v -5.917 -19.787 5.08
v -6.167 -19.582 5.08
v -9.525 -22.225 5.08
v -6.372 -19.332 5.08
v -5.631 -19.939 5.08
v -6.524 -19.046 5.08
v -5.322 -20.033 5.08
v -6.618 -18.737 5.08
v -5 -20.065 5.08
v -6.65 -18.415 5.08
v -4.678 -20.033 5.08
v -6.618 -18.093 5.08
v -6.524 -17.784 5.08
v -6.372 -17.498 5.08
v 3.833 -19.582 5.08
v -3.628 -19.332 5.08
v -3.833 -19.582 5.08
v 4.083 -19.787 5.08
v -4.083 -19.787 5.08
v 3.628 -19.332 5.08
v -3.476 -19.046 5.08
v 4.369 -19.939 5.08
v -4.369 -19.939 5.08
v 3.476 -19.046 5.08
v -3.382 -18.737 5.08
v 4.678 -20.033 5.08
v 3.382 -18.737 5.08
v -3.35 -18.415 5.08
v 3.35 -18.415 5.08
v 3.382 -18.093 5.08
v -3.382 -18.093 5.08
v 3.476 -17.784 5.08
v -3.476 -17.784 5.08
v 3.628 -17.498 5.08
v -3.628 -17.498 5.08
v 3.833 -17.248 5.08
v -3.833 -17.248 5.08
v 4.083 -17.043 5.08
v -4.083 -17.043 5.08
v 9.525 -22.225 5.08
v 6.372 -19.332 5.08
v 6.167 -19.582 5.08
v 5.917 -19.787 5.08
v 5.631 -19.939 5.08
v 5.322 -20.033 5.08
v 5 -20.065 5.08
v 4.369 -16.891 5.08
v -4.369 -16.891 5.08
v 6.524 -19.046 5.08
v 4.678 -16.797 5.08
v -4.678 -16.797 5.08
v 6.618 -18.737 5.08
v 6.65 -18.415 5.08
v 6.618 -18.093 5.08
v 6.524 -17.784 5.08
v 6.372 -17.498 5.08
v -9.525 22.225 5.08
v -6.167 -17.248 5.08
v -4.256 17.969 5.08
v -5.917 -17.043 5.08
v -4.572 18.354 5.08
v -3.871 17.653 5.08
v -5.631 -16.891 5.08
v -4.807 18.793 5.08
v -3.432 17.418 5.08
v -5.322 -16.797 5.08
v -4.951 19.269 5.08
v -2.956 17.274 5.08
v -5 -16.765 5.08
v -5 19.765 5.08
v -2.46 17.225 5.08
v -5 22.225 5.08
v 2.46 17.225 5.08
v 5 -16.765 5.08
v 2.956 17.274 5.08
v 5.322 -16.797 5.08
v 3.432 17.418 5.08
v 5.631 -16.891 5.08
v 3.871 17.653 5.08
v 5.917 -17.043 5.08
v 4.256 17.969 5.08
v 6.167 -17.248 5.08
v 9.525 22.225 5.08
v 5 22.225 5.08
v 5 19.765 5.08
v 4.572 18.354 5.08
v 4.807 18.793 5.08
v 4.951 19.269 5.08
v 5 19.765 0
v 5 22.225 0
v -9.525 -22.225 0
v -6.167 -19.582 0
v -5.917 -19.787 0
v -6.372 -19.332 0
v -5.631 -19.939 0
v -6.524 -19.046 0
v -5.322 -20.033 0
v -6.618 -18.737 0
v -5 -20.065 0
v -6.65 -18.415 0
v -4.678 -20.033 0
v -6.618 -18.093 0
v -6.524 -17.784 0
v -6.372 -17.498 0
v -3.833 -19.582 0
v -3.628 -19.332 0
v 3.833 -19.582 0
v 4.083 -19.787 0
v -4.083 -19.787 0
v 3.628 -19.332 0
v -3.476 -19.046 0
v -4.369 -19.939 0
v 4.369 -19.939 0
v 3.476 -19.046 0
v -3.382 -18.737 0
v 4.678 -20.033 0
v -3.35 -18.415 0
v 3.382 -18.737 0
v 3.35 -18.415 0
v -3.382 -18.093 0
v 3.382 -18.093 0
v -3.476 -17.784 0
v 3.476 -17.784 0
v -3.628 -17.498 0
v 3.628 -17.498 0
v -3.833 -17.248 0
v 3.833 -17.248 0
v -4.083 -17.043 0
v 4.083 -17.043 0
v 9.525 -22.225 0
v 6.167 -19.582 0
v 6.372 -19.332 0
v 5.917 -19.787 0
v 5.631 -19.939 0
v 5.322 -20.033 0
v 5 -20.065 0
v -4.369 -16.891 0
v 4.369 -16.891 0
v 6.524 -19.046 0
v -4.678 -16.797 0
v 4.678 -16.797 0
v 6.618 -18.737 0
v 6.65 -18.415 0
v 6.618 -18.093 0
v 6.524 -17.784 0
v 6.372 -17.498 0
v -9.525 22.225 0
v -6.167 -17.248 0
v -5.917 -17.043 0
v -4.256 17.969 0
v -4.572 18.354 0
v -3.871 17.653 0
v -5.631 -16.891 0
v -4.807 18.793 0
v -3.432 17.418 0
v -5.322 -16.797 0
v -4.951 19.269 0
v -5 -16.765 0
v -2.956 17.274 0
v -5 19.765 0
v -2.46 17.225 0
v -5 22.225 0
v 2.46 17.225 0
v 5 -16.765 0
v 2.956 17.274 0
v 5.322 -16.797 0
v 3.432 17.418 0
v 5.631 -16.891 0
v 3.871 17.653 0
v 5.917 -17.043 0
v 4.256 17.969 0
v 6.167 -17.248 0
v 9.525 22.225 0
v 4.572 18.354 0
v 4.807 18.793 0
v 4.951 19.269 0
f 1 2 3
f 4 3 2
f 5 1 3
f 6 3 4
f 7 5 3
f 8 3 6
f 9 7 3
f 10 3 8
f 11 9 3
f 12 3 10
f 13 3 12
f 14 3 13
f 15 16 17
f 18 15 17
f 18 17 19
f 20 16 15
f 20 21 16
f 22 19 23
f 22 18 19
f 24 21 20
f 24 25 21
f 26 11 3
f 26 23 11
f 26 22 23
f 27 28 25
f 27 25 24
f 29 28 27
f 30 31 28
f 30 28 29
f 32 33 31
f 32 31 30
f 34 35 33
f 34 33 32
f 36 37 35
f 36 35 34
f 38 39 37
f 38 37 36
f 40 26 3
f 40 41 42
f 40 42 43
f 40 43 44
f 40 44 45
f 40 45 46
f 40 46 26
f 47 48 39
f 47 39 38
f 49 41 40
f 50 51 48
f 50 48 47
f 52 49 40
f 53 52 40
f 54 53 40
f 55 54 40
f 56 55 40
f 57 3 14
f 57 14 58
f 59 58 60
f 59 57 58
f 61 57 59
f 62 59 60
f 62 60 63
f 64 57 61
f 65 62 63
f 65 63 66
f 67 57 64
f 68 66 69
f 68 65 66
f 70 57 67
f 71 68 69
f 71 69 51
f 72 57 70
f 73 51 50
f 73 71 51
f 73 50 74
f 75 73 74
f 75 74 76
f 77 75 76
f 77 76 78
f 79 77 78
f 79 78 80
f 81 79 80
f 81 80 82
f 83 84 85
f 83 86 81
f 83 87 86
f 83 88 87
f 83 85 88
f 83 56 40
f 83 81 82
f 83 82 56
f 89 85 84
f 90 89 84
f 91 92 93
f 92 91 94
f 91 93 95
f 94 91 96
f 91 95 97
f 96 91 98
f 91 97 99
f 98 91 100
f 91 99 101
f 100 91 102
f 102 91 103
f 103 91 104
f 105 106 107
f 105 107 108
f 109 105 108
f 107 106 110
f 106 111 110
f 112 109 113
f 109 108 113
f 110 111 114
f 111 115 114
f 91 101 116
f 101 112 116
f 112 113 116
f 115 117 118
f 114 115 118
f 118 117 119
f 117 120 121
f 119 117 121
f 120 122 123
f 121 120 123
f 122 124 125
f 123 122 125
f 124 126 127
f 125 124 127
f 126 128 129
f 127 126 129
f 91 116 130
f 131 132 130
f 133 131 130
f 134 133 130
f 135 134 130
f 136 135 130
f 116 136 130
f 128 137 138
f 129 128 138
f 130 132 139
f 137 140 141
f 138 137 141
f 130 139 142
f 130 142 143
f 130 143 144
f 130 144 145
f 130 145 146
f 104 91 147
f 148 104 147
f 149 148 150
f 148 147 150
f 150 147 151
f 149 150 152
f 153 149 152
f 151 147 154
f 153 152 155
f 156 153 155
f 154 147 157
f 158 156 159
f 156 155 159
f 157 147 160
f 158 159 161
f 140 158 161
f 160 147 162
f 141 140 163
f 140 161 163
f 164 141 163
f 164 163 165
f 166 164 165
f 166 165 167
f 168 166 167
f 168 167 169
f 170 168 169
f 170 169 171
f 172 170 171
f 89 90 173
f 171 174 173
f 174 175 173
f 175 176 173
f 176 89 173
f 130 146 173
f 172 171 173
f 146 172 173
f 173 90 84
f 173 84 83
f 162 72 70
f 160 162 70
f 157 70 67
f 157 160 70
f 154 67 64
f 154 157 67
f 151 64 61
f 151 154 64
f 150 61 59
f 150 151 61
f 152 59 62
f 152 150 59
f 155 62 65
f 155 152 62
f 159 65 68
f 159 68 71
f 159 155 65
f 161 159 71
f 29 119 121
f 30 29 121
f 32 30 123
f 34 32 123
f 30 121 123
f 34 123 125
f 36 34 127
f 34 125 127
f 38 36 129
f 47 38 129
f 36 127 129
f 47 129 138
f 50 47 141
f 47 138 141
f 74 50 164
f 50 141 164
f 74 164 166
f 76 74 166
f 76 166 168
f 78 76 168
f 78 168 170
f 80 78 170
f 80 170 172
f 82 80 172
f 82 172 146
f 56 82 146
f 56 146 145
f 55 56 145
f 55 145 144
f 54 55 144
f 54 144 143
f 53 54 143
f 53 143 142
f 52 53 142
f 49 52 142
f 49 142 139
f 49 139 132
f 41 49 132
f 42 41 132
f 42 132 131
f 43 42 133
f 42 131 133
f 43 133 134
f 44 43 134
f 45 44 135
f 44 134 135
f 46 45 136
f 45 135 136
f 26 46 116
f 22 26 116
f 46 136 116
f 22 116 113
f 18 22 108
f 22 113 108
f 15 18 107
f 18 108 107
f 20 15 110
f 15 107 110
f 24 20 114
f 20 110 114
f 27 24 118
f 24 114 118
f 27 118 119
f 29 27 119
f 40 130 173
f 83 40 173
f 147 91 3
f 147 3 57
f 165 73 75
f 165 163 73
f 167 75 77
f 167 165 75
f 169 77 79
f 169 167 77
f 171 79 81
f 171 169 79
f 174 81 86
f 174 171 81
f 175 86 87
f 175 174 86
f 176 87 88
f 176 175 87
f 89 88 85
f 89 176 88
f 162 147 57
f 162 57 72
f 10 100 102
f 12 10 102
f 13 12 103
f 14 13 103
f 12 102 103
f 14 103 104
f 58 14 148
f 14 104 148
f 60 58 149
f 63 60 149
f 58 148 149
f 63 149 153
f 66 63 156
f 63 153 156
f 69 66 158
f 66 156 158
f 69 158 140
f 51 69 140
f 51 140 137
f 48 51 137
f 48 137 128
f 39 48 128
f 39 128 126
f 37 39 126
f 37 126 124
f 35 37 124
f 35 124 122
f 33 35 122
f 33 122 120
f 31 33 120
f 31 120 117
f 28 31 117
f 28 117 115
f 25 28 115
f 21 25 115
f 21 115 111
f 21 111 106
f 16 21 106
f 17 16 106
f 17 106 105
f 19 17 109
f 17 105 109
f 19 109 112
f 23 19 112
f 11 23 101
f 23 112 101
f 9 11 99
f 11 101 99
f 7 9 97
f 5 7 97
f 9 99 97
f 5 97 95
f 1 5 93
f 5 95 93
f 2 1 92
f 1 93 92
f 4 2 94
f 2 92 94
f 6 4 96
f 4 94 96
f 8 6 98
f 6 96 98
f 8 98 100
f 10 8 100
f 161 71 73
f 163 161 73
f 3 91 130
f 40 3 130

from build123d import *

# Parameters (mm, degrees)
F0_W     = 19.05
F0_H     = 44.45
F1_DEPTH = 5.08
F2_W     = 10
F2_H     = 5
F3_DEPTH = 25.4
F4_R     = 2.54
F6_D     = 3.3
F6_DEPTH = 12.7
F6_TIP   = 0.9914200214


with BuildPart() as f1:
    # F0 (on Top) → F1 (new body)
    with BuildSketch(Plane.XY):
        Rectangle(F0_W, F0_H)
    extrude(amount=F1_DEPTH)

    # F2 (on face) → F3 (cut)
    with BuildSketch(Plane.XY.offset(5.08)):
        with Locations((0, 24.725)):
            Rectangle(F2_W, F2_H)
        with Locations((0, 19.725)):
            Rectangle(F2_W, F2_H)
    extrude(amount=-F3_DEPTH, mode=Mode.SUBTRACT)

    # F4
    f4_edges = [f1.edges().sort_by_distance(p)[0] for p in [
        (-5, 17.225, 2.54),
        (5, 17.225, 2.54),
    ]]
    fillet(f4_edges, radius=F4_R)

    # F6
    with Locations(Plane.XY.offset(5.08)):
        with Locations((-5, -18.415), (5, -18.415)):
            Hole(F6_D / 2, depth=F6_DEPTH)
            with Locations((0, 0, -(F6_DEPTH + F6_TIP / 2))):  # 118° drill point
                Cone(0, F6_D / 2, F6_TIP, mode=Mode.SUBTRACT)


solid = f1.part
